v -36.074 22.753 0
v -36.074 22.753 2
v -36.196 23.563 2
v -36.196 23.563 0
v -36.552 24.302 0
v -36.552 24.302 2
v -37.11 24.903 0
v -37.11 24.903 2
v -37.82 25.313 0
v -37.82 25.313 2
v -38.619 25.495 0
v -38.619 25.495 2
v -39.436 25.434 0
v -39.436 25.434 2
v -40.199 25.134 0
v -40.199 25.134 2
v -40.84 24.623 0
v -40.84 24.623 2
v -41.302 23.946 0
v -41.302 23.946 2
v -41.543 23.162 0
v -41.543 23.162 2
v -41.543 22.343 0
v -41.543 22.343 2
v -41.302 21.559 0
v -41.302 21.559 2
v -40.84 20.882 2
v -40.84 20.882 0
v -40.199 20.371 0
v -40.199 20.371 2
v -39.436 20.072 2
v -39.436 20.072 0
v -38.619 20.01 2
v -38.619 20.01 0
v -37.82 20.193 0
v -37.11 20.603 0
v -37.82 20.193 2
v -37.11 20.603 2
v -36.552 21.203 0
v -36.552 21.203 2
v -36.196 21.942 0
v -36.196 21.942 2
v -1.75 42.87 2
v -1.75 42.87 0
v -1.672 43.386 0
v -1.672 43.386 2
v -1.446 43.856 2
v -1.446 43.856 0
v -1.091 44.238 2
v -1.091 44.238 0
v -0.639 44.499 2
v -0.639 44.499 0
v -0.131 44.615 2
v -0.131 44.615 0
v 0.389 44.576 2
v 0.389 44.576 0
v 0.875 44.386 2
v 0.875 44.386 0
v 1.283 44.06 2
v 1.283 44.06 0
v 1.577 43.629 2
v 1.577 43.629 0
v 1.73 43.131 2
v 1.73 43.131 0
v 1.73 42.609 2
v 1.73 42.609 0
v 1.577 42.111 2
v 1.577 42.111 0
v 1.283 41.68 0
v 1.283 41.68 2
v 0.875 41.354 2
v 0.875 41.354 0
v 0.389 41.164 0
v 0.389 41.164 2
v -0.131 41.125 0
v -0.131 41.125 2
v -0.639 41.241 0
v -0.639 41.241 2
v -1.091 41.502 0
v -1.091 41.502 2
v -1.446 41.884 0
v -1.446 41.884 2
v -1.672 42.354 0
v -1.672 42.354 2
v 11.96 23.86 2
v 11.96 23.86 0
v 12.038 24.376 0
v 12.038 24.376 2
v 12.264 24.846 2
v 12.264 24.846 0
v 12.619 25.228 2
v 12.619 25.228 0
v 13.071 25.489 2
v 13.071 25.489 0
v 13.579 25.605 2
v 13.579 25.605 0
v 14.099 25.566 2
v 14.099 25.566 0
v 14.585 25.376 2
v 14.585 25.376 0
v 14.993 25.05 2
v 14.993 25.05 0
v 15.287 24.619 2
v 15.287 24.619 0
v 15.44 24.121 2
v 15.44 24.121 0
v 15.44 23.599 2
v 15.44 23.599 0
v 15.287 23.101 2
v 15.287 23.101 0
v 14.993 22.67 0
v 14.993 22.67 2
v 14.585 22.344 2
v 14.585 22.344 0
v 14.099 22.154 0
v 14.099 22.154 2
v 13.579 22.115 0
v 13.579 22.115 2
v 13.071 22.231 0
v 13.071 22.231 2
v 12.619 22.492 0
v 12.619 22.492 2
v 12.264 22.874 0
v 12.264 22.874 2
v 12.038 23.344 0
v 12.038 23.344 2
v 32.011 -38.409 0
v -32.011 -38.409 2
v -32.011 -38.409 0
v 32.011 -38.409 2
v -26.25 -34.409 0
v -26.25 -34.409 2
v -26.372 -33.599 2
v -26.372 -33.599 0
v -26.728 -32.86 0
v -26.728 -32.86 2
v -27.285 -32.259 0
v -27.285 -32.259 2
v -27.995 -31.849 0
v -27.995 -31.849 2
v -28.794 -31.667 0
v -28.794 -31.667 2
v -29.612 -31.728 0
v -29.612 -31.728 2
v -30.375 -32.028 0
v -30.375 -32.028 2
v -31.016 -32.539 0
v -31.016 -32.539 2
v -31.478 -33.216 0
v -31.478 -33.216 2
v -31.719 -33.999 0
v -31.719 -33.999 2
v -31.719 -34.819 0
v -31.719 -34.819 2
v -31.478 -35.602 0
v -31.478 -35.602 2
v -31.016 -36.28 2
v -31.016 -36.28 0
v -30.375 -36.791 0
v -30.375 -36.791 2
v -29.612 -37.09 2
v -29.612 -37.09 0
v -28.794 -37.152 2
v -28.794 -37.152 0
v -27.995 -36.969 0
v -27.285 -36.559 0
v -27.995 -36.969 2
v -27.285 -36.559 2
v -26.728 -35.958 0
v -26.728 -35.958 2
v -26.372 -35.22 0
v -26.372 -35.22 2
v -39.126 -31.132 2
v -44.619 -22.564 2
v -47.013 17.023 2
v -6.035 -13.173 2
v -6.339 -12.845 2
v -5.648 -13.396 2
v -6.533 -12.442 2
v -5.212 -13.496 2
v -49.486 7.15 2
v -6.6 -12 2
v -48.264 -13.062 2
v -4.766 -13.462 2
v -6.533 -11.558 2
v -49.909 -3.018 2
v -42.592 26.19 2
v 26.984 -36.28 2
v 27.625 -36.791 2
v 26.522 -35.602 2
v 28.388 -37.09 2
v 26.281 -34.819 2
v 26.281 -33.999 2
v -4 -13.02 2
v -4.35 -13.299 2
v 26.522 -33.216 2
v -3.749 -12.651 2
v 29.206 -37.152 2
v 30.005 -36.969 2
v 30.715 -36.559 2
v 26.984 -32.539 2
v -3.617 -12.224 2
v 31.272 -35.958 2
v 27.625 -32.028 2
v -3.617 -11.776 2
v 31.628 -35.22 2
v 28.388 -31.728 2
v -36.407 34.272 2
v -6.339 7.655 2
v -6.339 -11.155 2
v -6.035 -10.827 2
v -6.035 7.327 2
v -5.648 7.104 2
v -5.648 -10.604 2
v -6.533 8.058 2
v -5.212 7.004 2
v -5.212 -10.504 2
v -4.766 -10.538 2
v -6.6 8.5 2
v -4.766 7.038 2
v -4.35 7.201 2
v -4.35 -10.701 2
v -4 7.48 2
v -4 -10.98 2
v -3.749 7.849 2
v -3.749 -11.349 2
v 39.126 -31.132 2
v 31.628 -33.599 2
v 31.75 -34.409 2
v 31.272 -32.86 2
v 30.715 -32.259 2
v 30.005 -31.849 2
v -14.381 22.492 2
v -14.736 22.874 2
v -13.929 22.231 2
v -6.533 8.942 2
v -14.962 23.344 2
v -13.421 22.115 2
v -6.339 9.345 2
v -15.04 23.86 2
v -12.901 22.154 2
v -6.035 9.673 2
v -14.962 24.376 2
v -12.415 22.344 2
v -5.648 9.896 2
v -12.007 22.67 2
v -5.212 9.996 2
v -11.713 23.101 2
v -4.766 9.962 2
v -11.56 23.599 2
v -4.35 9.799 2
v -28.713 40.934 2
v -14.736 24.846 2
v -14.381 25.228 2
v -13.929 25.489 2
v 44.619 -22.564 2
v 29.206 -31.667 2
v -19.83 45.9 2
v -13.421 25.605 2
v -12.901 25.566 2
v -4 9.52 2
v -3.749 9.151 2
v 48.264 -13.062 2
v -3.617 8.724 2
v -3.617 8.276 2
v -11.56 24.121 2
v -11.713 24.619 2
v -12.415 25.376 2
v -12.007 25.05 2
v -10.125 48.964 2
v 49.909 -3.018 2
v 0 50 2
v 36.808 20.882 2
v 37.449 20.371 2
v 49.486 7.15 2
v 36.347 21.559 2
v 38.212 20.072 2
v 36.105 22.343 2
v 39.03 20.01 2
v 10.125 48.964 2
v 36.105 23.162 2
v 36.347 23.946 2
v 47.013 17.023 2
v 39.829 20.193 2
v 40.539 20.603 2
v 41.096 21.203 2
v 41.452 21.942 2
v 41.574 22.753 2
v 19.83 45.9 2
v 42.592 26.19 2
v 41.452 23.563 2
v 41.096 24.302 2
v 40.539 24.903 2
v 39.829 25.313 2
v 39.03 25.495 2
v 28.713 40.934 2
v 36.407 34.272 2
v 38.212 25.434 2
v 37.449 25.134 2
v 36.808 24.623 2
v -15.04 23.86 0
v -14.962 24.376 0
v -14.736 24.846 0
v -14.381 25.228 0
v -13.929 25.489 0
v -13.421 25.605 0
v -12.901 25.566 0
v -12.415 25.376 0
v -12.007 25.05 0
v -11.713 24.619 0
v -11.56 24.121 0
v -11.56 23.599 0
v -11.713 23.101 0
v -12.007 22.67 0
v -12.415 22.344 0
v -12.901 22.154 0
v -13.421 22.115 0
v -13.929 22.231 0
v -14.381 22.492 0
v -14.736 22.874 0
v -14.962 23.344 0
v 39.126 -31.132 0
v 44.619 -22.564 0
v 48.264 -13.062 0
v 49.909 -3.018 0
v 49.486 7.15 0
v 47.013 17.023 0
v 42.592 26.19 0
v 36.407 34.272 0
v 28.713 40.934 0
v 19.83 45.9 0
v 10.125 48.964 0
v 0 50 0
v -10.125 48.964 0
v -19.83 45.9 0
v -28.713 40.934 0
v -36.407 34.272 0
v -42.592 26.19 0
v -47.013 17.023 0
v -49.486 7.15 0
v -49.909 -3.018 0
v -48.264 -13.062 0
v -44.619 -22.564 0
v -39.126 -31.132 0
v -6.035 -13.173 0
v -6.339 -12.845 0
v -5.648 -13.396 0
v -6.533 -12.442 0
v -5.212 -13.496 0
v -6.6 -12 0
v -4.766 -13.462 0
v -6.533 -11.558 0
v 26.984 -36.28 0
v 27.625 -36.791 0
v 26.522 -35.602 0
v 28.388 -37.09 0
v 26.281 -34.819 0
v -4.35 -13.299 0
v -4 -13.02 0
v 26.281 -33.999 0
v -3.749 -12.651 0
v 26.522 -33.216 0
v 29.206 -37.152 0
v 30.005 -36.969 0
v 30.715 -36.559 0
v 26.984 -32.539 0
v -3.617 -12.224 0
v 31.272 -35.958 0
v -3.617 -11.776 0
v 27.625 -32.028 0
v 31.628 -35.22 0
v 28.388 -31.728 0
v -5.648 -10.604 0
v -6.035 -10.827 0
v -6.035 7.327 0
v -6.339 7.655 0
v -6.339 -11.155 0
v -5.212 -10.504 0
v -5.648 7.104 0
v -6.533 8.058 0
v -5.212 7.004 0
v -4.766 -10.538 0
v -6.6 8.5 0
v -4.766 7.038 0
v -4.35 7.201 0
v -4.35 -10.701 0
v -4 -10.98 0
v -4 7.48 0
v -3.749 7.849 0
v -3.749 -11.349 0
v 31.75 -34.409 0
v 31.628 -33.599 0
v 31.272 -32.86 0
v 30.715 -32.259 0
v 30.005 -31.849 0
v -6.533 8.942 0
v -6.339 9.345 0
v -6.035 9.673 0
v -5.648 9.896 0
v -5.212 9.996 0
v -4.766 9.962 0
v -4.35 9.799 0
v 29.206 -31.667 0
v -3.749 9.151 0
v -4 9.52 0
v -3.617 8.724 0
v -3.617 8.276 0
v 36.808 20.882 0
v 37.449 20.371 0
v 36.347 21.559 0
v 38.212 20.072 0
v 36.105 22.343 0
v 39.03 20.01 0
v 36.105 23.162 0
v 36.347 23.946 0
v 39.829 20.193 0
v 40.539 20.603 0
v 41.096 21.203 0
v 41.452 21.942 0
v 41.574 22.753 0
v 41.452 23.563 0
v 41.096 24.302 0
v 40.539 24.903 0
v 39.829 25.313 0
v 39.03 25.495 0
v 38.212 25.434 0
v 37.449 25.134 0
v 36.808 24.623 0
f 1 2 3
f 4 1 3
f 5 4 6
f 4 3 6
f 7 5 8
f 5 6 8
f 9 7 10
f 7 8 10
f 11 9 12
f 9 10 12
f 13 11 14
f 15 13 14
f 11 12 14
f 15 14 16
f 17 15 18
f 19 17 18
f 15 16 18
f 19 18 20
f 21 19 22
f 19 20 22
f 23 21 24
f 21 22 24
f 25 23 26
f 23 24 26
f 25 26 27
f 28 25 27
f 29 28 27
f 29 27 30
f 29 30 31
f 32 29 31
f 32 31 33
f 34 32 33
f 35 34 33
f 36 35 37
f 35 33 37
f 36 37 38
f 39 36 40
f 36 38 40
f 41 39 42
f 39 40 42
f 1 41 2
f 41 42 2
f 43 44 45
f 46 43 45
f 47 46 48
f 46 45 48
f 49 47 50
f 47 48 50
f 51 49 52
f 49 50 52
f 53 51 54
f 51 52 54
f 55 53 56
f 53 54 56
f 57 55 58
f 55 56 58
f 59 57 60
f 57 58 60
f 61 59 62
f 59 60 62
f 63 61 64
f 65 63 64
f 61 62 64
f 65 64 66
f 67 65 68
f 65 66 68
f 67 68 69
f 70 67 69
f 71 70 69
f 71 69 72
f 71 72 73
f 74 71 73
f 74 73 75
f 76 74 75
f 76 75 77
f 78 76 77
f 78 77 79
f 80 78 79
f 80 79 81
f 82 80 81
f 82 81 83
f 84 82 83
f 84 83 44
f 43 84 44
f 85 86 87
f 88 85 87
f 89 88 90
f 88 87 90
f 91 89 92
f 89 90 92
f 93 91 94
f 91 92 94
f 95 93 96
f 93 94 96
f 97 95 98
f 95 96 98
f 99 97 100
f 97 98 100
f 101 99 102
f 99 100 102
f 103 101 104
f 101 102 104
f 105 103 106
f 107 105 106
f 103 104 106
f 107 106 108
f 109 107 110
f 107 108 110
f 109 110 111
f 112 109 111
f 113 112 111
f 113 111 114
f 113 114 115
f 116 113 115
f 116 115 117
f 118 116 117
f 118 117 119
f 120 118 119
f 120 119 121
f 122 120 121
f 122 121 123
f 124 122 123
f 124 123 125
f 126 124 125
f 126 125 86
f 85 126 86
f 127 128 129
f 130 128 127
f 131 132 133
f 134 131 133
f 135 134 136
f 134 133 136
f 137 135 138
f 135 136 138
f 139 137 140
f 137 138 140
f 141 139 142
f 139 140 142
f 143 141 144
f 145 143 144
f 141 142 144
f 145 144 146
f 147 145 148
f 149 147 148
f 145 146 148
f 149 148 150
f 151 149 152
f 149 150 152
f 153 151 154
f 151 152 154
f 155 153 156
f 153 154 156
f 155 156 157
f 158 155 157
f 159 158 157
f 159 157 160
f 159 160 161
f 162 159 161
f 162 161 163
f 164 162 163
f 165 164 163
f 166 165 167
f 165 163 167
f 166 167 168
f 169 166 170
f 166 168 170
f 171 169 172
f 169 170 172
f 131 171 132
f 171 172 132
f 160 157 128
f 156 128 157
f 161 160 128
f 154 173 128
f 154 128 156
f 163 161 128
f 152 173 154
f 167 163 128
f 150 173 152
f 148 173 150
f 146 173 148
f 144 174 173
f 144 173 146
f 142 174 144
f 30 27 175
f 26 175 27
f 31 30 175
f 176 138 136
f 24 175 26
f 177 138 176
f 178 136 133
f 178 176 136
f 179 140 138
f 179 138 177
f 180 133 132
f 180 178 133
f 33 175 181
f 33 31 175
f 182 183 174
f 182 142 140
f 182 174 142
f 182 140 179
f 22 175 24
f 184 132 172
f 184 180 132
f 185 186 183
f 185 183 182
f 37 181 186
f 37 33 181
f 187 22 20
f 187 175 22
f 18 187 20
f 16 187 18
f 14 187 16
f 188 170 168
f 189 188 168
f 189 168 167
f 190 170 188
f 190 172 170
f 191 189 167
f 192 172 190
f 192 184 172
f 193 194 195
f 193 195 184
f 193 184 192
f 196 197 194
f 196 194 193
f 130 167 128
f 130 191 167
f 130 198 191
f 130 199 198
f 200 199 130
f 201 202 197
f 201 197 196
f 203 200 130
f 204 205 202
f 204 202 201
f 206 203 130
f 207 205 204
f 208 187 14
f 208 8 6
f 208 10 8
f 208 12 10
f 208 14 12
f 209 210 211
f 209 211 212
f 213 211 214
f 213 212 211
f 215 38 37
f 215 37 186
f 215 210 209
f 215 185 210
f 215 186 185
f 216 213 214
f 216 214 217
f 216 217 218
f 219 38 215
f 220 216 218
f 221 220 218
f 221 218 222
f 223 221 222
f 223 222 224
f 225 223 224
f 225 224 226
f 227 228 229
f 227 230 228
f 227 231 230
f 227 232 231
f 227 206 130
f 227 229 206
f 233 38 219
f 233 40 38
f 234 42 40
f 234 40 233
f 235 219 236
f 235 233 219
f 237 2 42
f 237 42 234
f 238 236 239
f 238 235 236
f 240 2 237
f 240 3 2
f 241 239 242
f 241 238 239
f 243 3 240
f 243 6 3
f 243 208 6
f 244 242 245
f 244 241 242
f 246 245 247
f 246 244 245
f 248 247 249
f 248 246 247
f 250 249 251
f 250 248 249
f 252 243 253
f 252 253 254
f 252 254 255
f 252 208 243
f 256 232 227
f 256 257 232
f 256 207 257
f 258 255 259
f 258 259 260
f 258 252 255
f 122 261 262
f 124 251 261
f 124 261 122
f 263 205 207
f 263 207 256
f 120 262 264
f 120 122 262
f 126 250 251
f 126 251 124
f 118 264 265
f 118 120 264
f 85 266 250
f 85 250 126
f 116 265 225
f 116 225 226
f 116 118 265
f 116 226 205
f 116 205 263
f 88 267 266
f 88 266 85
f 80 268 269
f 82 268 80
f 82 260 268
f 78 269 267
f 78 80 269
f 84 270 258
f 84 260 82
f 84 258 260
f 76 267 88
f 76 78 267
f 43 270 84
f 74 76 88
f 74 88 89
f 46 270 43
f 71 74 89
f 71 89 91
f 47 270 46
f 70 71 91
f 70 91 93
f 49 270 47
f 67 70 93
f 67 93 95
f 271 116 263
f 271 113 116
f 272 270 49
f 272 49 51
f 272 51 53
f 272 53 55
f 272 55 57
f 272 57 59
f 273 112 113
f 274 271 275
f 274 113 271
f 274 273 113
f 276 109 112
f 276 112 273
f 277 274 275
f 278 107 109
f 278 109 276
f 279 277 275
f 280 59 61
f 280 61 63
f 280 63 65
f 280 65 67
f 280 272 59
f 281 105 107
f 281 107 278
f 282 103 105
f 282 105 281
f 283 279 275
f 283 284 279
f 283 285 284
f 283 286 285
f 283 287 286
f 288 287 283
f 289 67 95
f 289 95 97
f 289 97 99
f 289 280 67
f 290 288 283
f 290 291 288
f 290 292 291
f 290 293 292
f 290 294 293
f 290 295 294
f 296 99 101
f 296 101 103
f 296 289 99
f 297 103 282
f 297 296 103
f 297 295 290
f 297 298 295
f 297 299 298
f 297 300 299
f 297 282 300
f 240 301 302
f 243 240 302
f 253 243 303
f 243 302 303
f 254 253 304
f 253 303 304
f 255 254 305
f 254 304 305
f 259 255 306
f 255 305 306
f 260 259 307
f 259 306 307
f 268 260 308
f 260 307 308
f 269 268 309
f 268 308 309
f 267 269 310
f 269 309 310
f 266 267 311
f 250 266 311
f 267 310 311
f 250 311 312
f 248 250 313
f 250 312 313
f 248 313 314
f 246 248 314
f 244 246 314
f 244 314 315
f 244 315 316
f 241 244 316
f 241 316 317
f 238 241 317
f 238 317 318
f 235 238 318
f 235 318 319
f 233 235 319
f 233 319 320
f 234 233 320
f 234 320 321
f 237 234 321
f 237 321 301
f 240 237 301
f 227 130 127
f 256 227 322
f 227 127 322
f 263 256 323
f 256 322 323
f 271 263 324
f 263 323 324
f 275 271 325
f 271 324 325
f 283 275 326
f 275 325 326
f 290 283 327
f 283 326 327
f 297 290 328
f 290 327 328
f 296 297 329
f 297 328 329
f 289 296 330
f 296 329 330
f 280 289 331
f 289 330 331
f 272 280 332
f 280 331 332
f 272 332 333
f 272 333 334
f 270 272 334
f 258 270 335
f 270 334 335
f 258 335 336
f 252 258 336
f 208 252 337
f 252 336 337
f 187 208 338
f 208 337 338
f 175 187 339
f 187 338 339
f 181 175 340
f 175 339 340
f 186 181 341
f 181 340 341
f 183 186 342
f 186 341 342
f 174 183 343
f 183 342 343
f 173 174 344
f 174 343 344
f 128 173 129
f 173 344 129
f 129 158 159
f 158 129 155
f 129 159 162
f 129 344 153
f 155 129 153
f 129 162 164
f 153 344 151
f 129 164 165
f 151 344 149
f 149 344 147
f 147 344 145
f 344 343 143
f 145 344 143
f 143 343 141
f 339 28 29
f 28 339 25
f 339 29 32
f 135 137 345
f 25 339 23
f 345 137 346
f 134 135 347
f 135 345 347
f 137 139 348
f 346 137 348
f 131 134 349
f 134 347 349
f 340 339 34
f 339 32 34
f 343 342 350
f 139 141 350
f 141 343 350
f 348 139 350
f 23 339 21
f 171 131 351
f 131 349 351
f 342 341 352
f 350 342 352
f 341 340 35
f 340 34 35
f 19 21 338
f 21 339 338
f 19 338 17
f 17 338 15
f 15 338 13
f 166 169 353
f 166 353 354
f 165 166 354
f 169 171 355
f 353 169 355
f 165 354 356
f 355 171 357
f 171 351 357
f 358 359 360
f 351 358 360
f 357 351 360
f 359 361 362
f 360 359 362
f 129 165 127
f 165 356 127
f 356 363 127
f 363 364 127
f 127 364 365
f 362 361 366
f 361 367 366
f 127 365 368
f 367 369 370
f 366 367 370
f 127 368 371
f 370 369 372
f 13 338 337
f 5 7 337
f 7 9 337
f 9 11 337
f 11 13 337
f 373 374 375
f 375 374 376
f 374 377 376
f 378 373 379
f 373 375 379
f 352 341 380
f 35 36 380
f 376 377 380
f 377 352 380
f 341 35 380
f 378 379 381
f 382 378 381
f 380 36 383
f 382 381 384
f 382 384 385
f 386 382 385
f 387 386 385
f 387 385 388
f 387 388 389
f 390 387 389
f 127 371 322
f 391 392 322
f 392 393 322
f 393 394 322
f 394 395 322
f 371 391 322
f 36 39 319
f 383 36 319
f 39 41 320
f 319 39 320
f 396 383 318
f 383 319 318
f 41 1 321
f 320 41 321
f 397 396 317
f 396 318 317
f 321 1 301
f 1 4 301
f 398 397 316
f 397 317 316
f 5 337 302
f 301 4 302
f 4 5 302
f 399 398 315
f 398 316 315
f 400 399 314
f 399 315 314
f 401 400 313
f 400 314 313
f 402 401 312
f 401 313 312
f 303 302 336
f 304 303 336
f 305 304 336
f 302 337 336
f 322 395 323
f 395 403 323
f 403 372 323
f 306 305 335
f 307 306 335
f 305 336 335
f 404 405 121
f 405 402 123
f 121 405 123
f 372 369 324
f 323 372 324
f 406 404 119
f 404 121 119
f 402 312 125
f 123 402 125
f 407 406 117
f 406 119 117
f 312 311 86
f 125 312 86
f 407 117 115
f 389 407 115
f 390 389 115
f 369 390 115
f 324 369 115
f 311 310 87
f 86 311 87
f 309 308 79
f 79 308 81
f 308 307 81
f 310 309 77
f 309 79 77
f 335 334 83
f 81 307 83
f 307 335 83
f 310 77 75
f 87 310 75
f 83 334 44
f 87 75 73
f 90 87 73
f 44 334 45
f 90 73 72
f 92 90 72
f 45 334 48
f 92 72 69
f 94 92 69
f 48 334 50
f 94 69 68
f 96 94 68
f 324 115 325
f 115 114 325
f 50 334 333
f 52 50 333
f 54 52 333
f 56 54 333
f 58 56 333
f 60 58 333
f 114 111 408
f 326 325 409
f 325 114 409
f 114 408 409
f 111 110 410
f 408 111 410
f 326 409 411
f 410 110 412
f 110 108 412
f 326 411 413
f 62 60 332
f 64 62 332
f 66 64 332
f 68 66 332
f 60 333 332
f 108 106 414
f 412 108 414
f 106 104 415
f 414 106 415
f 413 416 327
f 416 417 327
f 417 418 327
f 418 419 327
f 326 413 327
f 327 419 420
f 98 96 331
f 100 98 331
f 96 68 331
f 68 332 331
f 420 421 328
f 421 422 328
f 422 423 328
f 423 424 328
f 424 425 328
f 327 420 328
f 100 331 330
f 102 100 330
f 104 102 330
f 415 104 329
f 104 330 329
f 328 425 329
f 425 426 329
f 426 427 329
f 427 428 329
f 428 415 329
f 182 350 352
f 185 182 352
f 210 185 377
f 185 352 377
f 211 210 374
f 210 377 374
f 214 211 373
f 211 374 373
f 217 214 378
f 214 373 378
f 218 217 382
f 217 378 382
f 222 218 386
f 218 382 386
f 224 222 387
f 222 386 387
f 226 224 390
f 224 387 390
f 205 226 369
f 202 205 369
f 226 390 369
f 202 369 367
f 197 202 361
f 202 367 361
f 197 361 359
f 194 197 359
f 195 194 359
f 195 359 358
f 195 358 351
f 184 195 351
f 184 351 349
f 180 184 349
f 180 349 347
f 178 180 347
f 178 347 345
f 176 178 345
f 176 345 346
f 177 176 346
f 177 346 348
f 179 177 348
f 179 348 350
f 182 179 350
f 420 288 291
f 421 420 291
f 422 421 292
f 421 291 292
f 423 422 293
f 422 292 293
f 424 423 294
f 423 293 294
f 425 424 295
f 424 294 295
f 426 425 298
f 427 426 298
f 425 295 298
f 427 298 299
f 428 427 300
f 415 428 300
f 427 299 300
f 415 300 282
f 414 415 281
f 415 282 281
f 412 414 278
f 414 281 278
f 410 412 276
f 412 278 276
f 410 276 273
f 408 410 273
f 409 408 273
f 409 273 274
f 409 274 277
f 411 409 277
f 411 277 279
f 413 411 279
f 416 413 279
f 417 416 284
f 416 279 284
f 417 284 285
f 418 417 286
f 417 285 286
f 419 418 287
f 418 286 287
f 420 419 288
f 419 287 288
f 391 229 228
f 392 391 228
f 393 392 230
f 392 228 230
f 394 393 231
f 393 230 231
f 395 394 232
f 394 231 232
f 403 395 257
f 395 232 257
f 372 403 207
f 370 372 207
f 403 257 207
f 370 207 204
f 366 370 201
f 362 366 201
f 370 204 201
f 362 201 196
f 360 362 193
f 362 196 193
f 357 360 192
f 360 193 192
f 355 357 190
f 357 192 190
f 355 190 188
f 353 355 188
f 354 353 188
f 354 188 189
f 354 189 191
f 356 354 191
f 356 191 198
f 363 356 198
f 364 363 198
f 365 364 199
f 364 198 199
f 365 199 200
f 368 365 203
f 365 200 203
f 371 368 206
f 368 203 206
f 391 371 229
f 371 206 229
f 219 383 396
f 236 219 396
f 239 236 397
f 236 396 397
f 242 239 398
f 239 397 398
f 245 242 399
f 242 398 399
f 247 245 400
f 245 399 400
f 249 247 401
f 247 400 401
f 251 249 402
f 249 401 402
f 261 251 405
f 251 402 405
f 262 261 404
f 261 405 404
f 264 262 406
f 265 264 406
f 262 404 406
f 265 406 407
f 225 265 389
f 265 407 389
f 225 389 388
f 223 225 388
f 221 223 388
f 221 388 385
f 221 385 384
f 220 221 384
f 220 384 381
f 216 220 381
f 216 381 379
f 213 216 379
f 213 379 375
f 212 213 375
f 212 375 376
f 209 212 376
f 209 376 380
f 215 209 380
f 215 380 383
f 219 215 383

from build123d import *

# Parameters (mm, degrees)
ESBO_O1_R                  = 50
RESSALTO_EXTRUS_O1_DEPTH   = 2
ESBO_O2_R                  = 2.75
CORTE_EXTRUS_O1_DEPTH      = 2
CORTE_EXTRUS_O2_DEPTH      = 1
CORTE_EXTRUS_O2_DEPTH_BACK = 10
ESBO_O5_R                  = 1.5
ESBO_O5_R_2                = 1.75
CORTE_EXTRUS_O3_DEPTH      = 10


with BuildPart() as part:
    # Esboço1 → Ressalto-extrusão1 (new body)
    with BuildSketch(Plane.XY):
        Circle(ESBO_O1_R)
    extrude(amount=RESSALTO_EXTRUS_O1_DEPTH)

    # Esboço2 → Corte-extrusão1 (cut)
    with BuildSketch(Plane.XY.offset(2)):
        with Locations((-29, -34.409301068)):
            Circle(ESBO_O2_R)
        with Locations((29, -34.409301068)):
            Circle(ESBO_O2_R)
        with Locations((-38.824197531, 22.752619324)):
            Circle(ESBO_O2_R)
        with Locations((38.824197531, 22.752619324)):
            Circle(ESBO_O2_R)
    extrude(amount=-CORTE_EXTRUS_O1_DEPTH, mode=Mode.SUBTRACT)

    # Esboço4 → Corte-extrusão2 (cut, two sides)
    with BuildSketch(Plane.XY.offset(2)) as corte_extrus_o2_sk:
        Polygon((-40.723859979, -38.409301068), (44.57073926, -38.409301068), (1.923439641, -68.002213614), align=None)
    extrude(amount=CORTE_EXTRUS_O2_DEPTH, mode=Mode.SUBTRACT)
    extrude(corte_extrus_o2_sk.sketch, amount=-CORTE_EXTRUS_O2_DEPTH_BACK, mode=Mode.SUBTRACT)

    # Esboço5 → Corte-extrusão3 (cut)
    with BuildSketch(Plane(origin=(0, 0, 0), x_dir=(-1, 0, 0), z_dir=(0, 0, -1))):
        with Locations((5.1, 8.5)):
            Circle(ESBO_O5_R)
        with Locations((5.1, -12)):
            Circle(ESBO_O5_R)
        with Locations((-13.71, 23.86)):
            Circle(ESBO_O5_R_2)
        with Locations((13.29, 23.86)):
            Circle(ESBO_O5_R_2)
        with Locations((0, 42.87)):
            Circle(ESBO_O5_R_2)
    extrude(amount=-CORTE_EXTRUS_O3_DEPTH, mode=Mode.SUBTRACT)


solid = part.part
